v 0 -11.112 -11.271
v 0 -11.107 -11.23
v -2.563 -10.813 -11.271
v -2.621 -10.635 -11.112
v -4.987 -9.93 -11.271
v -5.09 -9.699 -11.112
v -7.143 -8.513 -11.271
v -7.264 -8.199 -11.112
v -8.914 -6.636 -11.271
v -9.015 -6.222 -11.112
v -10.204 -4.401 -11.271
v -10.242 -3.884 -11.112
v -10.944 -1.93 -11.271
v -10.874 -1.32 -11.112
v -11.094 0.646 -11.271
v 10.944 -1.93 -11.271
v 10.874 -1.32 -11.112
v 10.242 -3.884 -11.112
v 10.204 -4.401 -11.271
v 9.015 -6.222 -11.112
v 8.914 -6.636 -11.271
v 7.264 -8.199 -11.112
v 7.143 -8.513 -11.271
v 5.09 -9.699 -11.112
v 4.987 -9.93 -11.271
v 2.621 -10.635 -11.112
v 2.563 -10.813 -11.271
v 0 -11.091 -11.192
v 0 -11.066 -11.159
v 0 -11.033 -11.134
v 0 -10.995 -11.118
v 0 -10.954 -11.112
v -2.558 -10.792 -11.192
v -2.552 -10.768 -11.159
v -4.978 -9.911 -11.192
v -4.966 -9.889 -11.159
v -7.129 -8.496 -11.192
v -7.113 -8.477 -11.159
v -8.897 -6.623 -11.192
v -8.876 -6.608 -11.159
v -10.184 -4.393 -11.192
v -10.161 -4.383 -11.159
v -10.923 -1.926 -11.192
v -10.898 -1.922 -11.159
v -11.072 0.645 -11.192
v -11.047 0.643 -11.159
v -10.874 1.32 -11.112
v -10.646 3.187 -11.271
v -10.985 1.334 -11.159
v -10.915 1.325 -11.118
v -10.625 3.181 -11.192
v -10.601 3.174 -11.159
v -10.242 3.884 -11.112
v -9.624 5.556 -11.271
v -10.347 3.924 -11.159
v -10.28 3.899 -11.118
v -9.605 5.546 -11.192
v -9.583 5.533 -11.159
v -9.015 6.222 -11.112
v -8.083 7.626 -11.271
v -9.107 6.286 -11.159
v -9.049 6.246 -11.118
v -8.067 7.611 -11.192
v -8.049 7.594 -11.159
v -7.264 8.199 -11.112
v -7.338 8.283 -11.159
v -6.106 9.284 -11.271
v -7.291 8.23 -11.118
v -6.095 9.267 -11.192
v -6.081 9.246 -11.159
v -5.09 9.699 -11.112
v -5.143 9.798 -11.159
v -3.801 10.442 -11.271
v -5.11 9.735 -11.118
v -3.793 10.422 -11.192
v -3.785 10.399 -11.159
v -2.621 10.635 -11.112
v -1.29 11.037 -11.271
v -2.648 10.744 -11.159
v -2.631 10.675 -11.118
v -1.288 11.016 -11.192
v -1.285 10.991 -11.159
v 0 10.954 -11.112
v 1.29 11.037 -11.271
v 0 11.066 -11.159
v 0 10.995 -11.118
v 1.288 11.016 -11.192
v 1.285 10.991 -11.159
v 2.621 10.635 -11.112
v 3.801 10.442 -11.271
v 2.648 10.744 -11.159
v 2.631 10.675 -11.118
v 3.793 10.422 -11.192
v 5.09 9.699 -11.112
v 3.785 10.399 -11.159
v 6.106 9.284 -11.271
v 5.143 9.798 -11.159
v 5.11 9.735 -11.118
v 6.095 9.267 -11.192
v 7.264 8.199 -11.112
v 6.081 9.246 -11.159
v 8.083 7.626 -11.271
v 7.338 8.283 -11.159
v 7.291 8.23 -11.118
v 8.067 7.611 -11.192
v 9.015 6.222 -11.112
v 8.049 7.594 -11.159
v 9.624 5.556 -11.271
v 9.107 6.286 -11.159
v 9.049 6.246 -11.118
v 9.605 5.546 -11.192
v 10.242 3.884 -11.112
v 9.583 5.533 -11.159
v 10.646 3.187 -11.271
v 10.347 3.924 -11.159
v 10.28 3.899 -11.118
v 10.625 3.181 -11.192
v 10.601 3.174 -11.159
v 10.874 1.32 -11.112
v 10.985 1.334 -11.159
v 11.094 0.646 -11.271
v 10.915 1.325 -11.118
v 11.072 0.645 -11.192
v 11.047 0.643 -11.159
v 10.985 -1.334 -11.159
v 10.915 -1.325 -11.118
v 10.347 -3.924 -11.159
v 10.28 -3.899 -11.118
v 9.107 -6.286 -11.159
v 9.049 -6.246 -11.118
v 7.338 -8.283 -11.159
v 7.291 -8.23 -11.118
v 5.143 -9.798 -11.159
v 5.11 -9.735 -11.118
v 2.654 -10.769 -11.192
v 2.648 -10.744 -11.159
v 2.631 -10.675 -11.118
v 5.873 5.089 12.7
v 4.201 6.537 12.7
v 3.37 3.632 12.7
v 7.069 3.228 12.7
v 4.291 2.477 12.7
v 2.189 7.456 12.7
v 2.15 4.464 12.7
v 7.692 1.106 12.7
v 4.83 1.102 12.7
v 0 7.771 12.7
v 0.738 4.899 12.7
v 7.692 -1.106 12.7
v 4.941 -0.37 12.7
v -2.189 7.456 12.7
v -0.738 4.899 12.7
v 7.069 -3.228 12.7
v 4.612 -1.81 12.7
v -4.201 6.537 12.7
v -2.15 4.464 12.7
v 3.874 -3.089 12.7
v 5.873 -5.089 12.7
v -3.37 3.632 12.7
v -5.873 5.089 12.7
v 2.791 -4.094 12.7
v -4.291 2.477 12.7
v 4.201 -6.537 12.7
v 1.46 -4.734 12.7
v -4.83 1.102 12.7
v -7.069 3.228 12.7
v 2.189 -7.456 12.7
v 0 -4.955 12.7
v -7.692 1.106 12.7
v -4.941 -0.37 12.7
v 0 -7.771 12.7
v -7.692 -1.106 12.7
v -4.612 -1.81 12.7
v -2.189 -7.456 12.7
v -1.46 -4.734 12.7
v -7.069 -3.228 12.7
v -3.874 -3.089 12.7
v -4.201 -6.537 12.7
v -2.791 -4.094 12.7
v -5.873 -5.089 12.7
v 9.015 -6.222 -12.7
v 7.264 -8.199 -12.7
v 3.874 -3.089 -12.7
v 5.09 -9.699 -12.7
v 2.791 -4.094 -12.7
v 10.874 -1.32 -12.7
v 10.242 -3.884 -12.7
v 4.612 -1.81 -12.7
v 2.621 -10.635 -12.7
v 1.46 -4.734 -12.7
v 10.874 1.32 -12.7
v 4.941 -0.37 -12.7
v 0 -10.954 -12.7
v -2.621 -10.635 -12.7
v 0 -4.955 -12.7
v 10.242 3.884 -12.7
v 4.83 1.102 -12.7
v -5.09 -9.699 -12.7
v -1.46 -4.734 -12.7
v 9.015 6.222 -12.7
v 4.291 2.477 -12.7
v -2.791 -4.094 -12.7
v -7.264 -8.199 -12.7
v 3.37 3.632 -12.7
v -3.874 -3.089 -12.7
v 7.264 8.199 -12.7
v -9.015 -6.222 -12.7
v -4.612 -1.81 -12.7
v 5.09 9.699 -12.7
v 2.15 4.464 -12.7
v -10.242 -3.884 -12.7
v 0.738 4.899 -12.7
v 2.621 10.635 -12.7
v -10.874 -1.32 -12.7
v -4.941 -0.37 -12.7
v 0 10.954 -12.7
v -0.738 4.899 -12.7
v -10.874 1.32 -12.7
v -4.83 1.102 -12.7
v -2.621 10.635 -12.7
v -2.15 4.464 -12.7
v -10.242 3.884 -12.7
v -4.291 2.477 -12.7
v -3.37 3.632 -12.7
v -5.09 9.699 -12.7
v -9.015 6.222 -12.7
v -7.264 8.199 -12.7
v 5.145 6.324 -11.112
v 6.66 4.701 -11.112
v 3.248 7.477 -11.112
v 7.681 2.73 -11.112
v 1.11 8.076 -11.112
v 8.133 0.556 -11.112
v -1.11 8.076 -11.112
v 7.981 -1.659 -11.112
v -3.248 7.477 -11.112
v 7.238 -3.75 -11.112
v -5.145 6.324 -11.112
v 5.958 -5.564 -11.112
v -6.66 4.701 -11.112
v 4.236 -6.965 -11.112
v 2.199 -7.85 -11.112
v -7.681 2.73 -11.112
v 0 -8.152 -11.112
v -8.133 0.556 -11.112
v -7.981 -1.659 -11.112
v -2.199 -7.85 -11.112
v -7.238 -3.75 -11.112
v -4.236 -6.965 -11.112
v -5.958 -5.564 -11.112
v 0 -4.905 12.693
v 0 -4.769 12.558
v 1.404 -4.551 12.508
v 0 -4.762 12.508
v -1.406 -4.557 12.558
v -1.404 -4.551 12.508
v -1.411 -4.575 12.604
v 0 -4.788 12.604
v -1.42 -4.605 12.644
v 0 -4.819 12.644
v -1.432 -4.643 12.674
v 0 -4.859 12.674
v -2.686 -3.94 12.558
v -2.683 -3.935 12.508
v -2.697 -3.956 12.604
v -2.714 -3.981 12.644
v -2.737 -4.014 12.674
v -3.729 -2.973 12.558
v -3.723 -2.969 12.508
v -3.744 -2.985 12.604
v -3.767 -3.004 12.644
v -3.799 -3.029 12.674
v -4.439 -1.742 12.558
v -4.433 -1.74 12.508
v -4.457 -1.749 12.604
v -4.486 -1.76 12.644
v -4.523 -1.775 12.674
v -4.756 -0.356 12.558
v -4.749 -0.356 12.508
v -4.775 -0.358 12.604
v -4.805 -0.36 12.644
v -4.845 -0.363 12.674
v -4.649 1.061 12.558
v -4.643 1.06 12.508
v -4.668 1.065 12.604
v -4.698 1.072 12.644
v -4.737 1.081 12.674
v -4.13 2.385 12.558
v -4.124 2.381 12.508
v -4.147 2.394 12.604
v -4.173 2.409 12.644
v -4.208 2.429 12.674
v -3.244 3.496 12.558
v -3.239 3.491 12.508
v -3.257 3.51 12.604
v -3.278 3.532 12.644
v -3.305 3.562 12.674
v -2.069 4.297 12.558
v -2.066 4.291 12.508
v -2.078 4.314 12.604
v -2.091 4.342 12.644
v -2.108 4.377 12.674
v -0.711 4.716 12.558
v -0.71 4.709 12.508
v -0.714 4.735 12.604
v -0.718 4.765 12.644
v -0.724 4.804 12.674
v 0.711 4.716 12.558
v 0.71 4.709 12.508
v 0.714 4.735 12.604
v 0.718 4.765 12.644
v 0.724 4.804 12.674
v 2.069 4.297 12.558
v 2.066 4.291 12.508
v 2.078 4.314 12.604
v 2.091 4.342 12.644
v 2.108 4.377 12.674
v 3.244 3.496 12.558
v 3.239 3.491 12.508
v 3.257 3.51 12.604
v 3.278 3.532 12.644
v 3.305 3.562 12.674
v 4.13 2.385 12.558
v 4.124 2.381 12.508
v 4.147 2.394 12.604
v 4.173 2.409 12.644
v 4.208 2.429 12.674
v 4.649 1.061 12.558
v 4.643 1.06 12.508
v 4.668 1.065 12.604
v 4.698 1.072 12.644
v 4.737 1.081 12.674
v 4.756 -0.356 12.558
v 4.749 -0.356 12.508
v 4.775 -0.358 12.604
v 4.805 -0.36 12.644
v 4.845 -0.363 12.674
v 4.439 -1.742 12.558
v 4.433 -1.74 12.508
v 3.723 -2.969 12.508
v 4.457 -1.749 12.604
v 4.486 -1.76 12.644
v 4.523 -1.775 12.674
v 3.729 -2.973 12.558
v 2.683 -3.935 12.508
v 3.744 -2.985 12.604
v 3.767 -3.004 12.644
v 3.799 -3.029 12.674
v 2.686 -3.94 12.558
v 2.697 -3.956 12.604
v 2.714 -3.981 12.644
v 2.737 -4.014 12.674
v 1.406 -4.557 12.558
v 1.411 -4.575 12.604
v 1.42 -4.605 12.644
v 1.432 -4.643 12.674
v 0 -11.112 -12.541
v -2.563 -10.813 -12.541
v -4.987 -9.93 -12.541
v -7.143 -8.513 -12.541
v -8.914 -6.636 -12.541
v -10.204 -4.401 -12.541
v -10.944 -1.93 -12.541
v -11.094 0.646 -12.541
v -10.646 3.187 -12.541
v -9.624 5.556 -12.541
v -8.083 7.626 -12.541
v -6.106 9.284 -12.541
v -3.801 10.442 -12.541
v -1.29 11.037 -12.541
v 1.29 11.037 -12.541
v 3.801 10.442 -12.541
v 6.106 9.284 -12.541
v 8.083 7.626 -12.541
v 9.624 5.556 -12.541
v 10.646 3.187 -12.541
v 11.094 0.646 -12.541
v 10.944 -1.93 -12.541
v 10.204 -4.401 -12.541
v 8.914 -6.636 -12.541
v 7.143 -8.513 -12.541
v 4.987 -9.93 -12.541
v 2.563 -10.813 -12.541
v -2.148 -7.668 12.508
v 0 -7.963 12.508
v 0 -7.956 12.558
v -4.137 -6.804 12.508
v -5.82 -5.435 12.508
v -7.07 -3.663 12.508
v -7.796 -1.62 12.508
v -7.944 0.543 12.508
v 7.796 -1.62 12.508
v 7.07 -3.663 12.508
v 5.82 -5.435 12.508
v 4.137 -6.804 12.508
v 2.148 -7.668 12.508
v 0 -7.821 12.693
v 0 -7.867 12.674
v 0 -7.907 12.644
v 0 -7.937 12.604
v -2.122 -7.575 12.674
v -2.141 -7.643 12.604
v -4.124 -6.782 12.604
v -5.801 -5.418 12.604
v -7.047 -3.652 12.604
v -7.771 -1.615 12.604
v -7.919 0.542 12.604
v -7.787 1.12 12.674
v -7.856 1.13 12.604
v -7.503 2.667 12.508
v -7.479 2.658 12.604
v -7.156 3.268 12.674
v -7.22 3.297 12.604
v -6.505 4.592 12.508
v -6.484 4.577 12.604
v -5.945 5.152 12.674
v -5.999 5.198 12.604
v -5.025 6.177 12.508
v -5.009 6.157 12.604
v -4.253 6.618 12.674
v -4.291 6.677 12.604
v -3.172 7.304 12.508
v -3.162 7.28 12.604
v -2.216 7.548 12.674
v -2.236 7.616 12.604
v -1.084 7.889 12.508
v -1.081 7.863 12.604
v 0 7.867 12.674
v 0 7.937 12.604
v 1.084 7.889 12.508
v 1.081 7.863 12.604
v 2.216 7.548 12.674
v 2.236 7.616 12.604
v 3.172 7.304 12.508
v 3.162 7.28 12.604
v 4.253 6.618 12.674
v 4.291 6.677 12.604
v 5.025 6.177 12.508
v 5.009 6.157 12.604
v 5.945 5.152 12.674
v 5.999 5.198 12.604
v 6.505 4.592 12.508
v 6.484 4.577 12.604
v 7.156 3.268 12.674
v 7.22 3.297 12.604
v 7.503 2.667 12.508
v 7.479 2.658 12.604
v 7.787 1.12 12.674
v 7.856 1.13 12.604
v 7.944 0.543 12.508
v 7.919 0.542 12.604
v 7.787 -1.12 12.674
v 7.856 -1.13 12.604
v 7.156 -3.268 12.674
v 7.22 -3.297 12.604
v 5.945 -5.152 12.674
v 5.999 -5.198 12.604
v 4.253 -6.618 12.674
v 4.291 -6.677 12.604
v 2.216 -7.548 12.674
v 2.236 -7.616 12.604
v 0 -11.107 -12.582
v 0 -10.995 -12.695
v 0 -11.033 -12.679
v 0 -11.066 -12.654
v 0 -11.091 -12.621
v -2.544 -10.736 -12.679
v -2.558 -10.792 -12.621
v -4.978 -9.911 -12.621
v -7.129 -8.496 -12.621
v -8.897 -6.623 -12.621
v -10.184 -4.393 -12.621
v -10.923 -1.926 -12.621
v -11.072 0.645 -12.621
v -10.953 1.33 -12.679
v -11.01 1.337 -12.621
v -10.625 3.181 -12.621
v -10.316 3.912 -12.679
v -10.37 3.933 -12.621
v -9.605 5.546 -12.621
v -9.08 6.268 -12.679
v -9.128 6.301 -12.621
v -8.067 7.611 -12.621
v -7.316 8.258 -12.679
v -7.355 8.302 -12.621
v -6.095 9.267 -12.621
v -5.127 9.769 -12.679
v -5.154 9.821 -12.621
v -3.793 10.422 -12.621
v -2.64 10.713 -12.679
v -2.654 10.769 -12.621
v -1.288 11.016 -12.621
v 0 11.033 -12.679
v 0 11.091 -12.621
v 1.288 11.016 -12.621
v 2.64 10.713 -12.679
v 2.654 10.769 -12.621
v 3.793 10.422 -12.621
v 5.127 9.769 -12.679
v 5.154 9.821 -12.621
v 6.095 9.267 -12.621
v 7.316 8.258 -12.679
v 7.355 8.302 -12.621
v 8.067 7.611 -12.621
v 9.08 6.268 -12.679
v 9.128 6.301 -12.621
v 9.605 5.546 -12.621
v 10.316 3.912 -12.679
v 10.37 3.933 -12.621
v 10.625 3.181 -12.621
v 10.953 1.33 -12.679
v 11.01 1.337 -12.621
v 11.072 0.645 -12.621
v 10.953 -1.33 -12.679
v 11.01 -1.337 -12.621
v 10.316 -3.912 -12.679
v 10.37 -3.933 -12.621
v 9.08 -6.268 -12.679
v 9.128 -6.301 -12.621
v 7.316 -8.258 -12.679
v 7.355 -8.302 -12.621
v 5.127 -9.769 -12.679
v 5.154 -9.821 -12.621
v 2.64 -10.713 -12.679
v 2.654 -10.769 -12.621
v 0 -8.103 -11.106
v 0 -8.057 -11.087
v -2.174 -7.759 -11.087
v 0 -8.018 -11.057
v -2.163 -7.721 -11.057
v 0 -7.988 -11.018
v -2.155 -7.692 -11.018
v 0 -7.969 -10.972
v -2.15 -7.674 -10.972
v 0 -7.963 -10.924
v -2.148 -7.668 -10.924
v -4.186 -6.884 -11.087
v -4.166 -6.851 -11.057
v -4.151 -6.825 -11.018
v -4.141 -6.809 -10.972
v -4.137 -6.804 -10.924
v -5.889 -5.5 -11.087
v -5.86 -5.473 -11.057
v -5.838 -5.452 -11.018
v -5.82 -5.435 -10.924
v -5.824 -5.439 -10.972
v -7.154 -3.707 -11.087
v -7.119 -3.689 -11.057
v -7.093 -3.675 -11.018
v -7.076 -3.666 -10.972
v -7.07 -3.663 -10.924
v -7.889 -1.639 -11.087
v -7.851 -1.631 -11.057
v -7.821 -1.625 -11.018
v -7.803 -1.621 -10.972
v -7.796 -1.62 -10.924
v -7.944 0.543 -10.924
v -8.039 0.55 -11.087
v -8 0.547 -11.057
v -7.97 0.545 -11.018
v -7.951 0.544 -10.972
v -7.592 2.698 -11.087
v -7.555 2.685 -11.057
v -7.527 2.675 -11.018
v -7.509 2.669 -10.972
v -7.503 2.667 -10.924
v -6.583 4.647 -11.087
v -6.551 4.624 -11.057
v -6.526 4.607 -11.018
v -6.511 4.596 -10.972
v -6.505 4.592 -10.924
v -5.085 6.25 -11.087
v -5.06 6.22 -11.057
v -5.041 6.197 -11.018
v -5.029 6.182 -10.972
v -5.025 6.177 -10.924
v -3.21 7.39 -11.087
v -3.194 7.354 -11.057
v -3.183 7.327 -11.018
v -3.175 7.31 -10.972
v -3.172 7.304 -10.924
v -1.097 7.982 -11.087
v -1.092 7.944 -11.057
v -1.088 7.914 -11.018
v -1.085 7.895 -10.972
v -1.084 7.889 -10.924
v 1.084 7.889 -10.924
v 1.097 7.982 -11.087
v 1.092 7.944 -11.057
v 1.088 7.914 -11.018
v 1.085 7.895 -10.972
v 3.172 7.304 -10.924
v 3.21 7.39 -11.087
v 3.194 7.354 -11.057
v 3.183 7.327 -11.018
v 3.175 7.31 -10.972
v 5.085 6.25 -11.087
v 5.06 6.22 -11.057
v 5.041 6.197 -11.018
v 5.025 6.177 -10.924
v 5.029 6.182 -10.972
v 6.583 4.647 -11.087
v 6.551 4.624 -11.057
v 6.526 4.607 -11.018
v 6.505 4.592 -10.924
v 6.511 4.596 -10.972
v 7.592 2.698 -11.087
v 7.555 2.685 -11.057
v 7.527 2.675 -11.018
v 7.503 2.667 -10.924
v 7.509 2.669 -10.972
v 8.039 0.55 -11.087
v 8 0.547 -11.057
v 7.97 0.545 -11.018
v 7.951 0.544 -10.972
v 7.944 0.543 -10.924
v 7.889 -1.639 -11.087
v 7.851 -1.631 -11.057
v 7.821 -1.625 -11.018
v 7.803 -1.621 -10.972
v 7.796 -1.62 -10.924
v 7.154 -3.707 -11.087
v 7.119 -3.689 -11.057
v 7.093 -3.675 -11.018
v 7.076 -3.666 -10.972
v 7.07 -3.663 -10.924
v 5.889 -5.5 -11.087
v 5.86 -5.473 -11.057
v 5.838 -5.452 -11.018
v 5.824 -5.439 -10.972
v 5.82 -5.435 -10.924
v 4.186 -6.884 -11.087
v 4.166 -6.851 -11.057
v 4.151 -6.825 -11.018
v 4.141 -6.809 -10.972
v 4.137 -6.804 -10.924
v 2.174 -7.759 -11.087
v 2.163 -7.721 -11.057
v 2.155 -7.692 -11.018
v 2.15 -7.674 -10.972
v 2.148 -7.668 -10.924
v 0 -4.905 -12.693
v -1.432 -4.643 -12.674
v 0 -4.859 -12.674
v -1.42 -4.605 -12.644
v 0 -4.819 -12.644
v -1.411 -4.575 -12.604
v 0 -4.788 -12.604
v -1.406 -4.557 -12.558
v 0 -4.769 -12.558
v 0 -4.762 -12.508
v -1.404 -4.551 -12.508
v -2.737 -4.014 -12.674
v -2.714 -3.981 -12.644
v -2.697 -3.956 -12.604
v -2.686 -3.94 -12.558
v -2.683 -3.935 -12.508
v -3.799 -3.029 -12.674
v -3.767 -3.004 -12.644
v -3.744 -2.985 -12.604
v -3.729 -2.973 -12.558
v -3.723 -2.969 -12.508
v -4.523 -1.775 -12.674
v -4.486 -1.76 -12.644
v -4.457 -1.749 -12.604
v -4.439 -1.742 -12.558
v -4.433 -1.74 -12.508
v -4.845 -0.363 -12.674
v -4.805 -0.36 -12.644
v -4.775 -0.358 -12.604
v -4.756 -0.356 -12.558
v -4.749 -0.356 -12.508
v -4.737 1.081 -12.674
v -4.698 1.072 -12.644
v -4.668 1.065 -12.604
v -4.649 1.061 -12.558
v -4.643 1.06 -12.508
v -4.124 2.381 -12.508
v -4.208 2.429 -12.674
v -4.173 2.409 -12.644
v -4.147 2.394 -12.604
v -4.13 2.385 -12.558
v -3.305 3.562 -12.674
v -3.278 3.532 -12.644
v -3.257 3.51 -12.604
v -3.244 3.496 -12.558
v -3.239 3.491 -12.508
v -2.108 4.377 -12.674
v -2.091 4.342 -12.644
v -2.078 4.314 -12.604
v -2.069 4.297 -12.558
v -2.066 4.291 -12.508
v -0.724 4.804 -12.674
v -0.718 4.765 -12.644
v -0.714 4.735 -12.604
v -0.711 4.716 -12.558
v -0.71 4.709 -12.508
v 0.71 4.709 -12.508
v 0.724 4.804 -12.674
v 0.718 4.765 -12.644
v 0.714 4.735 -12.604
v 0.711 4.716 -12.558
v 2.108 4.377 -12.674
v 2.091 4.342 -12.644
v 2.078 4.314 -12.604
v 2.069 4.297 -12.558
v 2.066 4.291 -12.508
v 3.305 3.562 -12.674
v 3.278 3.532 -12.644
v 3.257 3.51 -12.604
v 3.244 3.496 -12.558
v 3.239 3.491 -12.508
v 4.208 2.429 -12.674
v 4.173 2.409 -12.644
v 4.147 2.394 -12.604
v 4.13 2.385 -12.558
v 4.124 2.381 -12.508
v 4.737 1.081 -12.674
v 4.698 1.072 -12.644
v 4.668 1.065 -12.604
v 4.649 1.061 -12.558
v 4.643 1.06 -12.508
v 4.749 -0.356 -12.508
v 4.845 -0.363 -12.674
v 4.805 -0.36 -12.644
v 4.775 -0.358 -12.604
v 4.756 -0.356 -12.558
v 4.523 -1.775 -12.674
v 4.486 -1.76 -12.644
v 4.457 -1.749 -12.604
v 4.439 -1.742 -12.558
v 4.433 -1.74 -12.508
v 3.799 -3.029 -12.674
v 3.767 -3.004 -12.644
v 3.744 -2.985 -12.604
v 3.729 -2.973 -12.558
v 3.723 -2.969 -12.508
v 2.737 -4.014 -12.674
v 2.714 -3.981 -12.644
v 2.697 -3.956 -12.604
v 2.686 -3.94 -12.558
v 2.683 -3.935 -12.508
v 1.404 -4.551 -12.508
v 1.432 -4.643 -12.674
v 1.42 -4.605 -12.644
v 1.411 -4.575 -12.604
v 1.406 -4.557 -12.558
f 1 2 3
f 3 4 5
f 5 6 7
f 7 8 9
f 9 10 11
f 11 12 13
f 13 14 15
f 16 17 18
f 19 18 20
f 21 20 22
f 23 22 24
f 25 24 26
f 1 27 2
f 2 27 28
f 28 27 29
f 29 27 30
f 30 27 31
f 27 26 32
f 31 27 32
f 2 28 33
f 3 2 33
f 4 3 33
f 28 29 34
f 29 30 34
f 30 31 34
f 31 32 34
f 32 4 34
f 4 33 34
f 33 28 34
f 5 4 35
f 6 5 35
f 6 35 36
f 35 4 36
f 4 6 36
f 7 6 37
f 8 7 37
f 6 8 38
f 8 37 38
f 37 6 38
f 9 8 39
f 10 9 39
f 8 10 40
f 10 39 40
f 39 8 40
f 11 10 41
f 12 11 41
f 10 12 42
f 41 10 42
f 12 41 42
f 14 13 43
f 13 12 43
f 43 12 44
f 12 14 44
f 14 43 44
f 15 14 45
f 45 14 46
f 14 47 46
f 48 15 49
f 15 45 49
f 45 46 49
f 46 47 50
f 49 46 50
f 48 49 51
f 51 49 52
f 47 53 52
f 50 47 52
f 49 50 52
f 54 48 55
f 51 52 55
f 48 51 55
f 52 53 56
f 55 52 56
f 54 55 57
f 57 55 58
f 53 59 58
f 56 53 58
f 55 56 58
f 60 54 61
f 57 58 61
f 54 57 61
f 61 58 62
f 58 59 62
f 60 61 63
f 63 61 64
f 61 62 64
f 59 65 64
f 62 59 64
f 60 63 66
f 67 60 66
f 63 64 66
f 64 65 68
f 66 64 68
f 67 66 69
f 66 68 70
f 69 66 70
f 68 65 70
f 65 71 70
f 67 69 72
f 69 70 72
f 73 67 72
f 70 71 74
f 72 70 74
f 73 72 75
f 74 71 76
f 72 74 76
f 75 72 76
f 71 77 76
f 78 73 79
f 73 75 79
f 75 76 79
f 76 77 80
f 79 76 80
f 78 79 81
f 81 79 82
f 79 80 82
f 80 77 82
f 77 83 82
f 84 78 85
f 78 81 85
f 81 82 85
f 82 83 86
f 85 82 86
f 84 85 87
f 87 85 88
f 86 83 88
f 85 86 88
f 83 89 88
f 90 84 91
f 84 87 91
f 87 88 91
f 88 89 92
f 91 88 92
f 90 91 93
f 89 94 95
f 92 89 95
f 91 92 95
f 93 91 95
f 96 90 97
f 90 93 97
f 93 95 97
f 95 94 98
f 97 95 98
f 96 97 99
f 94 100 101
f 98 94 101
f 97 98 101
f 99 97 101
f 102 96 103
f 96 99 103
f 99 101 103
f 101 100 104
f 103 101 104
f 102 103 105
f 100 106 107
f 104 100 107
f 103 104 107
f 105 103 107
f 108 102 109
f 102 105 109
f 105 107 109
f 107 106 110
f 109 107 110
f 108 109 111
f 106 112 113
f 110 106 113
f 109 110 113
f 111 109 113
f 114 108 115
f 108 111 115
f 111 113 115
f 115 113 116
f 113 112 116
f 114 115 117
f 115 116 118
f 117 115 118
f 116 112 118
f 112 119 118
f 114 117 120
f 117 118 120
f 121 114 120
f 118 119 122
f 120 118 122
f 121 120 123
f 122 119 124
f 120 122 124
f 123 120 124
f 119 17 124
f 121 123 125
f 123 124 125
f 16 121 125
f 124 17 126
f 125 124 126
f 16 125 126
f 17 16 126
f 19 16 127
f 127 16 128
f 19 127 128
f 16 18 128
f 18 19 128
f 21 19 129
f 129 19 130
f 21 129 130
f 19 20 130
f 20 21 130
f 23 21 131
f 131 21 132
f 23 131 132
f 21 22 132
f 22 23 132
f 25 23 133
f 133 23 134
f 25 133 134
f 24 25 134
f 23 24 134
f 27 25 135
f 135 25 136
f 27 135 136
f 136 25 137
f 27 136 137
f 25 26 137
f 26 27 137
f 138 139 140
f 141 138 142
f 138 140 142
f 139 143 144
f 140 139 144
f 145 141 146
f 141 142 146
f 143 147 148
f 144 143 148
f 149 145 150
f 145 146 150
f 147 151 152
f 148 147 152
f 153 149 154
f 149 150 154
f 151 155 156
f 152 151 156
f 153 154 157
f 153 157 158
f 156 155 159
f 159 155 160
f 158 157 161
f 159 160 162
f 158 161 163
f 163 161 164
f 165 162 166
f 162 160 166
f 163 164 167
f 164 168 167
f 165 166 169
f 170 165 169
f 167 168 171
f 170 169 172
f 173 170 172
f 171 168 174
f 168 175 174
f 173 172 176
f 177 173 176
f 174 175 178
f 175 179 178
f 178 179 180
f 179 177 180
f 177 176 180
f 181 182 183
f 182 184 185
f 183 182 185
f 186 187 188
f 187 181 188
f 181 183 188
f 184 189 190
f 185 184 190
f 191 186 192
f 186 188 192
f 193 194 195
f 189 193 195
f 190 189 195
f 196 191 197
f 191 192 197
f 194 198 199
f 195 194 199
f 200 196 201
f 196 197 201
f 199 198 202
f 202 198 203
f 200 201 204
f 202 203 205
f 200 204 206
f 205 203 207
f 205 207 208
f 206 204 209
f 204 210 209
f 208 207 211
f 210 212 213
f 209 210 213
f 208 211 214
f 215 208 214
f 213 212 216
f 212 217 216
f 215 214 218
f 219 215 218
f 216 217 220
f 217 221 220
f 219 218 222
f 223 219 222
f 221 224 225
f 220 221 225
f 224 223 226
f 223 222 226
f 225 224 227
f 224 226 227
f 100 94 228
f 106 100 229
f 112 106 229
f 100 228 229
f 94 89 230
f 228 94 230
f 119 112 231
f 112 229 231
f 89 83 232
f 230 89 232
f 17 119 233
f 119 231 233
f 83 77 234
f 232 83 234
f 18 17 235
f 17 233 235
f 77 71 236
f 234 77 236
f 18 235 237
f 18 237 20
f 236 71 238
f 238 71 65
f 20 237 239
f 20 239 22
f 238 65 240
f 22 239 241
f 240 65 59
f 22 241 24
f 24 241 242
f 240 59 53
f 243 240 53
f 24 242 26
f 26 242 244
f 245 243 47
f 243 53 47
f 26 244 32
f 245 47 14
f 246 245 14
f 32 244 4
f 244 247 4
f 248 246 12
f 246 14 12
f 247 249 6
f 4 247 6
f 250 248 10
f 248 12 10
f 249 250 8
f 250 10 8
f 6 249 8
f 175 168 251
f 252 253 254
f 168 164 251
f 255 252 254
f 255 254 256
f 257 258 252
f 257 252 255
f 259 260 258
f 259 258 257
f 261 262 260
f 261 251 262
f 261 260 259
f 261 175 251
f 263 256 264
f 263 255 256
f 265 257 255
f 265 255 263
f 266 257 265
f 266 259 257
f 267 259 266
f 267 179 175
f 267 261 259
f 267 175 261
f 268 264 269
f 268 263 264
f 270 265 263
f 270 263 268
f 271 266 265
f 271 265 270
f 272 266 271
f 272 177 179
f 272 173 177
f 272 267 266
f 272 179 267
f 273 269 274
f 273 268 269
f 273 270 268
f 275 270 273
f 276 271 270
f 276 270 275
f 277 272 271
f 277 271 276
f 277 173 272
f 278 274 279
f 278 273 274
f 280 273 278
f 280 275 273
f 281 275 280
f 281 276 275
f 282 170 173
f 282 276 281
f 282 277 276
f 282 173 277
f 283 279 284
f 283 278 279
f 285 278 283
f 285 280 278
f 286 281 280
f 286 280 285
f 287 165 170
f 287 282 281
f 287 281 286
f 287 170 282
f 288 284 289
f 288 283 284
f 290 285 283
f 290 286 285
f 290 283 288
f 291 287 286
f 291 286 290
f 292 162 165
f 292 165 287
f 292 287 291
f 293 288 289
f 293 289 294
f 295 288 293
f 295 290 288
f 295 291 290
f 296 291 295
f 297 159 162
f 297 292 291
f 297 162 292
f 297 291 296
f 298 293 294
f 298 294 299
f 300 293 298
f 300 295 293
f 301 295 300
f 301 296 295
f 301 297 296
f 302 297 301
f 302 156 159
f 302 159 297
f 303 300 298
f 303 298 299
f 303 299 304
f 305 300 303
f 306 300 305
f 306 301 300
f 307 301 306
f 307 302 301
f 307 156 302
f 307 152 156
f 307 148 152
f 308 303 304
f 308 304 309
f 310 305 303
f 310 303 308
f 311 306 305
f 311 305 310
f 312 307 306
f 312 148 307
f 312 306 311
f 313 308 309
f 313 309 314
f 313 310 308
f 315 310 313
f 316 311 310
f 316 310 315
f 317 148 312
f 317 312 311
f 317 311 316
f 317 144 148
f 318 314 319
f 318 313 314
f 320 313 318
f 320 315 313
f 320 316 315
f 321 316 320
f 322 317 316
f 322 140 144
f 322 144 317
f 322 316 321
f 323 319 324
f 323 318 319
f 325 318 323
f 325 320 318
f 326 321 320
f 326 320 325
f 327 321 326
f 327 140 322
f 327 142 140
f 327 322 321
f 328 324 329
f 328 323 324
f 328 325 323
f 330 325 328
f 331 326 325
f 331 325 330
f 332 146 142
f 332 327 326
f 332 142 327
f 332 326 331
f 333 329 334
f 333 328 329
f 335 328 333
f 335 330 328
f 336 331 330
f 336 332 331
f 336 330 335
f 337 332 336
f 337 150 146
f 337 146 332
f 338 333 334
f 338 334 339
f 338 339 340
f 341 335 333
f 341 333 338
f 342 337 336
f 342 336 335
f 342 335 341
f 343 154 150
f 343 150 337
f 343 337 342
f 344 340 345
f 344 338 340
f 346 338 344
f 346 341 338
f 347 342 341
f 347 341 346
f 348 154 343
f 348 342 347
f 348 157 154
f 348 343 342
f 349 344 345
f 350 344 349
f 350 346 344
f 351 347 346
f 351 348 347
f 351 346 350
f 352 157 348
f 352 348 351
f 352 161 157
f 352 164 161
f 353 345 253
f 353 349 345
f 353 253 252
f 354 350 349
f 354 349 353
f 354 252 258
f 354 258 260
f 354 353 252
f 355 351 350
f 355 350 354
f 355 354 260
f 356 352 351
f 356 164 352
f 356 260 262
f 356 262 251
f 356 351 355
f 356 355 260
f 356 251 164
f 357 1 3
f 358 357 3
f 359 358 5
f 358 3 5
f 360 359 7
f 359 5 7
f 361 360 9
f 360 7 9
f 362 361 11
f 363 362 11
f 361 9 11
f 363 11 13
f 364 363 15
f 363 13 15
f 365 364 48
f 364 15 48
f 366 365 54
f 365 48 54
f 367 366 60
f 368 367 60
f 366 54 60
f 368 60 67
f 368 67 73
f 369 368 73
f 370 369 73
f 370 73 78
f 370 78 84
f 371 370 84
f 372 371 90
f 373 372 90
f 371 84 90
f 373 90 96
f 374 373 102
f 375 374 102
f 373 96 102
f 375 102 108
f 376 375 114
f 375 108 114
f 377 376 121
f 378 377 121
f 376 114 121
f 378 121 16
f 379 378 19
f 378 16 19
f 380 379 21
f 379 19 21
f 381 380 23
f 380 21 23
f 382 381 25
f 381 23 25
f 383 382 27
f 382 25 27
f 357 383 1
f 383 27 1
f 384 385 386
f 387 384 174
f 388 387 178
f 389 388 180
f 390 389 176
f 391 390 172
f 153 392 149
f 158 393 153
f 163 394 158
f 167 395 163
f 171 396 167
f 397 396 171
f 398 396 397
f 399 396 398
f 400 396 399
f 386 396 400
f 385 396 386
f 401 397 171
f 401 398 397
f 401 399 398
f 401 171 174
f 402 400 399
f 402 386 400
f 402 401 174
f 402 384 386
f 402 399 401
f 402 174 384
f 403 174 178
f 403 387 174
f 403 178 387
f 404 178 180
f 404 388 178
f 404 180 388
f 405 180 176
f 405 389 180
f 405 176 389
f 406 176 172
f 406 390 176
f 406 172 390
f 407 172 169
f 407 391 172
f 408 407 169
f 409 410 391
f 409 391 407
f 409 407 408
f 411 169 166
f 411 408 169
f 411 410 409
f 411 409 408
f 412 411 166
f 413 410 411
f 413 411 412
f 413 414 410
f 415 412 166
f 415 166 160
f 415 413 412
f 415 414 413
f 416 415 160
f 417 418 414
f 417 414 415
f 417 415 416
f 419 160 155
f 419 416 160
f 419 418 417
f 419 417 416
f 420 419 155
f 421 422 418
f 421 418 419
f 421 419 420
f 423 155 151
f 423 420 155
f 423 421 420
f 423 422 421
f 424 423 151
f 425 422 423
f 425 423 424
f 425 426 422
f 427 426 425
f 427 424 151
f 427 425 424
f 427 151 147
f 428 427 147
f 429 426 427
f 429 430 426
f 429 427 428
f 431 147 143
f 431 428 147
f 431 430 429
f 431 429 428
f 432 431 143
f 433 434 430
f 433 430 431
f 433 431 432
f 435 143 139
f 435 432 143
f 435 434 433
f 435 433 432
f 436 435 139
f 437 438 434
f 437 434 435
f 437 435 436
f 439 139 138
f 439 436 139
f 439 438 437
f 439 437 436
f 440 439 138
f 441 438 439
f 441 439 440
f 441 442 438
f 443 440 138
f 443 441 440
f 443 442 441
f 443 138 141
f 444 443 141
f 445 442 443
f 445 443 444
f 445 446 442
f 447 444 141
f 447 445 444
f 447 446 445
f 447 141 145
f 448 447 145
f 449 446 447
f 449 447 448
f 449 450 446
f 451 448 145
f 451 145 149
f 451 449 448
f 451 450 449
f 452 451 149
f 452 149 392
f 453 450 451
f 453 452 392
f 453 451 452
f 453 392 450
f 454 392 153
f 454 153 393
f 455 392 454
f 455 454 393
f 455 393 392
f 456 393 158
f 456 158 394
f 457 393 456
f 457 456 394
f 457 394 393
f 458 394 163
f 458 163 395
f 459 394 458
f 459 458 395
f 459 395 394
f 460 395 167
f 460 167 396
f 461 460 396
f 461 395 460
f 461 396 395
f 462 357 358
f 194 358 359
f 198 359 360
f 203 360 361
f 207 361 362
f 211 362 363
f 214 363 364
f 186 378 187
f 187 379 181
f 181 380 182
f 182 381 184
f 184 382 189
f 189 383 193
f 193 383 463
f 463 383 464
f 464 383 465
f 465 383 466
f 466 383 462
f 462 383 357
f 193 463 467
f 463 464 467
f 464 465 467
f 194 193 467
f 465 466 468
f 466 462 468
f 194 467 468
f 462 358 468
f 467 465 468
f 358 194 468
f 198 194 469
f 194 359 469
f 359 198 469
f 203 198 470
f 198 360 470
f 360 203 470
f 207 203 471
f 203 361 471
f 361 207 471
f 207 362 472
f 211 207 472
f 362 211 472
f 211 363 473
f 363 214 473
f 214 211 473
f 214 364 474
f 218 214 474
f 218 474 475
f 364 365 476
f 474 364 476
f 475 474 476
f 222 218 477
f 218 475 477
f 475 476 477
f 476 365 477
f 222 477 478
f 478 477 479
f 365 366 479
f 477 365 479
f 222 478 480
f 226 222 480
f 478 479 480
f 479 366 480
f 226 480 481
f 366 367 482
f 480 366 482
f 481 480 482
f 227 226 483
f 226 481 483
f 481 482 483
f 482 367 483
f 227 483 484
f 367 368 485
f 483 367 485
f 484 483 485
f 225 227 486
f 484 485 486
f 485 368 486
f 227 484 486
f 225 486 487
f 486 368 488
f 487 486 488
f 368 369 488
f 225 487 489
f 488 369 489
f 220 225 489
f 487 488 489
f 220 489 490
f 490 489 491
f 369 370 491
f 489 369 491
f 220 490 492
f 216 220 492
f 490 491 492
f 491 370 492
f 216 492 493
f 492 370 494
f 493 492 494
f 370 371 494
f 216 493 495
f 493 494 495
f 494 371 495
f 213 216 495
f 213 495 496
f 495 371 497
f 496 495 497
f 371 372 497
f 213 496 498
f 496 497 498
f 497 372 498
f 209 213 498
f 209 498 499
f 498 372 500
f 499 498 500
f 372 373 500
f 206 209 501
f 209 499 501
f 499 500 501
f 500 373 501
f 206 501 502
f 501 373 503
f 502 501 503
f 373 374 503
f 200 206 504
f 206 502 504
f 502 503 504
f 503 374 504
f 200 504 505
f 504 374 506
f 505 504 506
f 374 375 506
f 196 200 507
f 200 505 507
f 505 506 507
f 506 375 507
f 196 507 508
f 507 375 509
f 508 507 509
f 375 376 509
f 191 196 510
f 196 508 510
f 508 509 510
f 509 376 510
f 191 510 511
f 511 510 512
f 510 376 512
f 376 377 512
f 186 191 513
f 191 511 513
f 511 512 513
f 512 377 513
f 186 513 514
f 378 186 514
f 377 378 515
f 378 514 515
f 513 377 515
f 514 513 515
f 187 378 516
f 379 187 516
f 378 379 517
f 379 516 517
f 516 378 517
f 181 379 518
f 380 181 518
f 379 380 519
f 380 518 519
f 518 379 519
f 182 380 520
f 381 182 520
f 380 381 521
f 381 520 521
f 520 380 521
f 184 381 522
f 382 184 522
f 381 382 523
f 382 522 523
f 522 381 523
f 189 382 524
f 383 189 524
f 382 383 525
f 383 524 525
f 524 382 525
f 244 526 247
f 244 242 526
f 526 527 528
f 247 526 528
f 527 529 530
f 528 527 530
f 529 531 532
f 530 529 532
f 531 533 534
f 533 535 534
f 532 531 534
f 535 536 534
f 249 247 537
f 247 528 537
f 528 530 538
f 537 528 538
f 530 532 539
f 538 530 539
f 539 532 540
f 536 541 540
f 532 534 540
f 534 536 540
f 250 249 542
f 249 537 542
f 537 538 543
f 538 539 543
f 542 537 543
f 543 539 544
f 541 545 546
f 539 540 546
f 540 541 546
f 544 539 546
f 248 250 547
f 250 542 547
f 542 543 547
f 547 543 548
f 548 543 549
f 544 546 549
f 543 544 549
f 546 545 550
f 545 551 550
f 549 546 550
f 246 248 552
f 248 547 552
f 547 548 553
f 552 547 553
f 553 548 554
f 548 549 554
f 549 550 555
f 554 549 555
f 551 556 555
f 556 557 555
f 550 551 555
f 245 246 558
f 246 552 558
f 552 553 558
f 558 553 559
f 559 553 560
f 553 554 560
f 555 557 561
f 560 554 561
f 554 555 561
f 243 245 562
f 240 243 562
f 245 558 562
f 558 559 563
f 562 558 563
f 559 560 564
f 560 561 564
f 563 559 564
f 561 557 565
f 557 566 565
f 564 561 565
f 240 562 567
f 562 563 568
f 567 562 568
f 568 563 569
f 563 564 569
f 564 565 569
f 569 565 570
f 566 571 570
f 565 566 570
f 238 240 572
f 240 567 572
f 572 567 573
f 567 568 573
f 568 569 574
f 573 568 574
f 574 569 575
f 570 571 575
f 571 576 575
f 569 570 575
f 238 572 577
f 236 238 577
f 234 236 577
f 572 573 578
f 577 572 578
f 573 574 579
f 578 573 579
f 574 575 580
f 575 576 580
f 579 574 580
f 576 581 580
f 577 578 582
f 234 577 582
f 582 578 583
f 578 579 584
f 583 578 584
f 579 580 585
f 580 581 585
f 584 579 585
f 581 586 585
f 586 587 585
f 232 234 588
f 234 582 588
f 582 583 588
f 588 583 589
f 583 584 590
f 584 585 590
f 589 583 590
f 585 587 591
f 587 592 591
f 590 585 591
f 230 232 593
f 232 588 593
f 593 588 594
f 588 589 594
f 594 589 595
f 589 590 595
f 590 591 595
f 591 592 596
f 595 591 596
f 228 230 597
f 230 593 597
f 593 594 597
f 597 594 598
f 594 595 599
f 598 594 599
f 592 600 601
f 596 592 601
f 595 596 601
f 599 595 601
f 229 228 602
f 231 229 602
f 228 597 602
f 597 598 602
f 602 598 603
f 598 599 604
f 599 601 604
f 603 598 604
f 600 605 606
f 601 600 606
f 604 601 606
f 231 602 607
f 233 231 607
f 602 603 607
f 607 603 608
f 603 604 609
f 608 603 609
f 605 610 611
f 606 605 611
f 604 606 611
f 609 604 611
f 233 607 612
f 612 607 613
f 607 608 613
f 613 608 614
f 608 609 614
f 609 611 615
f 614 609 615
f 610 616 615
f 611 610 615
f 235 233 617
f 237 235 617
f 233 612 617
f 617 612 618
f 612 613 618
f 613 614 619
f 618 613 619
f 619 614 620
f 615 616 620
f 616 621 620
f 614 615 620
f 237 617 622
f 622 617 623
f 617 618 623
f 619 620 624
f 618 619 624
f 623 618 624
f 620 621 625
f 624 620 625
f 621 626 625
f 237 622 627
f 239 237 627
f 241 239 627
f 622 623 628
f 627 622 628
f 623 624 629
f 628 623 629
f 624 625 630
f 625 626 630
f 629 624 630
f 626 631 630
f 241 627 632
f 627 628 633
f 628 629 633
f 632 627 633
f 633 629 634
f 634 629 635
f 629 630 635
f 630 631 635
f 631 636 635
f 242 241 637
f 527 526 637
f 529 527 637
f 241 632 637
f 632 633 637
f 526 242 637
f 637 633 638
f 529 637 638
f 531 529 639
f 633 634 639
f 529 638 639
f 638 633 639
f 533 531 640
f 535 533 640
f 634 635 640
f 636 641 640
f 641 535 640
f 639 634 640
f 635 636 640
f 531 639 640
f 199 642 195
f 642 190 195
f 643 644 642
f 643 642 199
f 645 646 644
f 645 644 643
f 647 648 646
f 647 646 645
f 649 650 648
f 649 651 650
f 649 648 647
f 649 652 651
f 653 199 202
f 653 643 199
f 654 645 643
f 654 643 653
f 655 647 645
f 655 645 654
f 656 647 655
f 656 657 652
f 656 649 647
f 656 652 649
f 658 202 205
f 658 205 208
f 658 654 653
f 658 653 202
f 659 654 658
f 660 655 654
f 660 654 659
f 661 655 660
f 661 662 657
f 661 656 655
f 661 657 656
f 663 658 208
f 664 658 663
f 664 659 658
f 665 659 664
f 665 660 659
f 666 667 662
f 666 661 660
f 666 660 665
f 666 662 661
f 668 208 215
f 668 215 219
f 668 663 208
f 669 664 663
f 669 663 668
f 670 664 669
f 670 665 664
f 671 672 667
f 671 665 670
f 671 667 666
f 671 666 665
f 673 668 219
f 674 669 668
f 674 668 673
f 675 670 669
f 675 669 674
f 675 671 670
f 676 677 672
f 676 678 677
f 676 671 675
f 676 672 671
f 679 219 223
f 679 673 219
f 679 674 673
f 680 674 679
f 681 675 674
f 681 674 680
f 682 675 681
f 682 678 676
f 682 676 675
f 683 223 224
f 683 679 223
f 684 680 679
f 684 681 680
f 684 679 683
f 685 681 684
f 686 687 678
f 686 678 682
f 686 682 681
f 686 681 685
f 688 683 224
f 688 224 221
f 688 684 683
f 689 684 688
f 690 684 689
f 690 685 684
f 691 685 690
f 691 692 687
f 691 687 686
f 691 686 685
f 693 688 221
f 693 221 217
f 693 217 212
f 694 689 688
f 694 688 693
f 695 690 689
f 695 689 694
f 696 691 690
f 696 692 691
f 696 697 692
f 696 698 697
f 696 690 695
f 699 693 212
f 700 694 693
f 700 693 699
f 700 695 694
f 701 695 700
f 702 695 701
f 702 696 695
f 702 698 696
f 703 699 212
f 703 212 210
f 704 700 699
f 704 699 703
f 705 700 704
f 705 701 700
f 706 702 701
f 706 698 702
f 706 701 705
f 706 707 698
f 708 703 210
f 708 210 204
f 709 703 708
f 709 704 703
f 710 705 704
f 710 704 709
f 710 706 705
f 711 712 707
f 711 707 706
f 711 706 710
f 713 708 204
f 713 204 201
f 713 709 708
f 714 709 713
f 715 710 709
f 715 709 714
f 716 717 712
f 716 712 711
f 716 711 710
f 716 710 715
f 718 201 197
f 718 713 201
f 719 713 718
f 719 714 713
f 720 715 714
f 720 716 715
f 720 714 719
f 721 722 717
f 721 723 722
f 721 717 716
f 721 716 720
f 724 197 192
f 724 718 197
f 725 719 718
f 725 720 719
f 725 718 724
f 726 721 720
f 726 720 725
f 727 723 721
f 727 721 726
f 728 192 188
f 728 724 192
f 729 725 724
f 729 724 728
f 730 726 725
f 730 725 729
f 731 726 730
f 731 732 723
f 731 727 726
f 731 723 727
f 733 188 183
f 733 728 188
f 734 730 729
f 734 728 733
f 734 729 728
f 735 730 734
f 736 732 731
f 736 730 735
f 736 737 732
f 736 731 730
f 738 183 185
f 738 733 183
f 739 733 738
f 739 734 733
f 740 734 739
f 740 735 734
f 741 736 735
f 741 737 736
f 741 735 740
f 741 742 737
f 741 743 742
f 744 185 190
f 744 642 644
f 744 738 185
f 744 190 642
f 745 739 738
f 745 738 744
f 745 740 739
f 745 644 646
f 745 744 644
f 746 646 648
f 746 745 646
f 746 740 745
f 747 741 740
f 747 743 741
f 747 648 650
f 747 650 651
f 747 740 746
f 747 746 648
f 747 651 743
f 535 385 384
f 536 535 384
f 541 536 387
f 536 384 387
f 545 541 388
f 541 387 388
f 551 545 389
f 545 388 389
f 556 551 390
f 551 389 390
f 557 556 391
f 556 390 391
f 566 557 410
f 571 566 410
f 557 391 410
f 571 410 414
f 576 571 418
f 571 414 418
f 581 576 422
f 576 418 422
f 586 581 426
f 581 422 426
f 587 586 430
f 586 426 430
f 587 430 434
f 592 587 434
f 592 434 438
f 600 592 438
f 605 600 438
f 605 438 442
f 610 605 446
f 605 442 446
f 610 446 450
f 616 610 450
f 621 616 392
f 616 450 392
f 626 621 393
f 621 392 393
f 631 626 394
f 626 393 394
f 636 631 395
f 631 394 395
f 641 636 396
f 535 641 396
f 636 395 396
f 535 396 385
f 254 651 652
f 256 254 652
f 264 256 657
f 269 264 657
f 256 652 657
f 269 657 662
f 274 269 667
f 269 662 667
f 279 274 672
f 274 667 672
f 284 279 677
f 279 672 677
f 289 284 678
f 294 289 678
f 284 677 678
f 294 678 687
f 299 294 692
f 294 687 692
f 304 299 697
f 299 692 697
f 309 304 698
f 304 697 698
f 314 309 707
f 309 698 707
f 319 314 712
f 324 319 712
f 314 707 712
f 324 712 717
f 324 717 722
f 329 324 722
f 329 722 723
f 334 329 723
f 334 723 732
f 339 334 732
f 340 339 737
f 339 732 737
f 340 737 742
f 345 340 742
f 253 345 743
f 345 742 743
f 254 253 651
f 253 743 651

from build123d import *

# Parameters (mm, degrees)
FILLET1_R = 0.15875
FILLET2_R = 0.192024
FILLET3_R = 0.188976


with BuildPart() as part:
    # Sketch2 → Revolve1 (revolve)
    with BuildSketch(Plane(origin=(0, 0, 0), x_dir=(0, 0, -1), z_dir=(1, 0, 0)), mode=Mode.PRIVATE) as revolve1_sk:
        Polygon((-12.7, 4.7625), (12.7, 4.7625), (12.7, 11.1125), (11.1125, 11.1125), (11.1125, 7.9629), (-12.7, 7.9629), align=None)
    revolve(revolve1_sk.sketch.rotate(Axis((0, 0, 12.7), (0, 0, -1)), 180), axis=Axis((0, 0, 12.7), (0, 0, -1)))

    # Fillet1
    fillet1_edges = [part.edges().sort_by_distance(p)[0] for p in [
        (0, 11.1125, -11.1125),
        (0, 11.1125, -12.7),
    ]]
    fillet(fillet1_edges, radius=FILLET1_R)

    # Fillet2
    fillet2_edges = [part.edges().sort_by_distance(p)[0] for p in [
        (0, 7.9629, 12.7),
        (0, 4.7625, -12.7),
        (0, 4.7625, 12.7),
    ]]
    fillet(fillet2_edges, radius=FILLET2_R)

    # Fillet3
    fillet3_edges = [part.edges().sort_by_distance(p)[0] for p in [
        (0, 7.9629, -11.1125),
    ]]
    fillet(fillet3_edges, radius=FILLET3_R)


solid = part.part
